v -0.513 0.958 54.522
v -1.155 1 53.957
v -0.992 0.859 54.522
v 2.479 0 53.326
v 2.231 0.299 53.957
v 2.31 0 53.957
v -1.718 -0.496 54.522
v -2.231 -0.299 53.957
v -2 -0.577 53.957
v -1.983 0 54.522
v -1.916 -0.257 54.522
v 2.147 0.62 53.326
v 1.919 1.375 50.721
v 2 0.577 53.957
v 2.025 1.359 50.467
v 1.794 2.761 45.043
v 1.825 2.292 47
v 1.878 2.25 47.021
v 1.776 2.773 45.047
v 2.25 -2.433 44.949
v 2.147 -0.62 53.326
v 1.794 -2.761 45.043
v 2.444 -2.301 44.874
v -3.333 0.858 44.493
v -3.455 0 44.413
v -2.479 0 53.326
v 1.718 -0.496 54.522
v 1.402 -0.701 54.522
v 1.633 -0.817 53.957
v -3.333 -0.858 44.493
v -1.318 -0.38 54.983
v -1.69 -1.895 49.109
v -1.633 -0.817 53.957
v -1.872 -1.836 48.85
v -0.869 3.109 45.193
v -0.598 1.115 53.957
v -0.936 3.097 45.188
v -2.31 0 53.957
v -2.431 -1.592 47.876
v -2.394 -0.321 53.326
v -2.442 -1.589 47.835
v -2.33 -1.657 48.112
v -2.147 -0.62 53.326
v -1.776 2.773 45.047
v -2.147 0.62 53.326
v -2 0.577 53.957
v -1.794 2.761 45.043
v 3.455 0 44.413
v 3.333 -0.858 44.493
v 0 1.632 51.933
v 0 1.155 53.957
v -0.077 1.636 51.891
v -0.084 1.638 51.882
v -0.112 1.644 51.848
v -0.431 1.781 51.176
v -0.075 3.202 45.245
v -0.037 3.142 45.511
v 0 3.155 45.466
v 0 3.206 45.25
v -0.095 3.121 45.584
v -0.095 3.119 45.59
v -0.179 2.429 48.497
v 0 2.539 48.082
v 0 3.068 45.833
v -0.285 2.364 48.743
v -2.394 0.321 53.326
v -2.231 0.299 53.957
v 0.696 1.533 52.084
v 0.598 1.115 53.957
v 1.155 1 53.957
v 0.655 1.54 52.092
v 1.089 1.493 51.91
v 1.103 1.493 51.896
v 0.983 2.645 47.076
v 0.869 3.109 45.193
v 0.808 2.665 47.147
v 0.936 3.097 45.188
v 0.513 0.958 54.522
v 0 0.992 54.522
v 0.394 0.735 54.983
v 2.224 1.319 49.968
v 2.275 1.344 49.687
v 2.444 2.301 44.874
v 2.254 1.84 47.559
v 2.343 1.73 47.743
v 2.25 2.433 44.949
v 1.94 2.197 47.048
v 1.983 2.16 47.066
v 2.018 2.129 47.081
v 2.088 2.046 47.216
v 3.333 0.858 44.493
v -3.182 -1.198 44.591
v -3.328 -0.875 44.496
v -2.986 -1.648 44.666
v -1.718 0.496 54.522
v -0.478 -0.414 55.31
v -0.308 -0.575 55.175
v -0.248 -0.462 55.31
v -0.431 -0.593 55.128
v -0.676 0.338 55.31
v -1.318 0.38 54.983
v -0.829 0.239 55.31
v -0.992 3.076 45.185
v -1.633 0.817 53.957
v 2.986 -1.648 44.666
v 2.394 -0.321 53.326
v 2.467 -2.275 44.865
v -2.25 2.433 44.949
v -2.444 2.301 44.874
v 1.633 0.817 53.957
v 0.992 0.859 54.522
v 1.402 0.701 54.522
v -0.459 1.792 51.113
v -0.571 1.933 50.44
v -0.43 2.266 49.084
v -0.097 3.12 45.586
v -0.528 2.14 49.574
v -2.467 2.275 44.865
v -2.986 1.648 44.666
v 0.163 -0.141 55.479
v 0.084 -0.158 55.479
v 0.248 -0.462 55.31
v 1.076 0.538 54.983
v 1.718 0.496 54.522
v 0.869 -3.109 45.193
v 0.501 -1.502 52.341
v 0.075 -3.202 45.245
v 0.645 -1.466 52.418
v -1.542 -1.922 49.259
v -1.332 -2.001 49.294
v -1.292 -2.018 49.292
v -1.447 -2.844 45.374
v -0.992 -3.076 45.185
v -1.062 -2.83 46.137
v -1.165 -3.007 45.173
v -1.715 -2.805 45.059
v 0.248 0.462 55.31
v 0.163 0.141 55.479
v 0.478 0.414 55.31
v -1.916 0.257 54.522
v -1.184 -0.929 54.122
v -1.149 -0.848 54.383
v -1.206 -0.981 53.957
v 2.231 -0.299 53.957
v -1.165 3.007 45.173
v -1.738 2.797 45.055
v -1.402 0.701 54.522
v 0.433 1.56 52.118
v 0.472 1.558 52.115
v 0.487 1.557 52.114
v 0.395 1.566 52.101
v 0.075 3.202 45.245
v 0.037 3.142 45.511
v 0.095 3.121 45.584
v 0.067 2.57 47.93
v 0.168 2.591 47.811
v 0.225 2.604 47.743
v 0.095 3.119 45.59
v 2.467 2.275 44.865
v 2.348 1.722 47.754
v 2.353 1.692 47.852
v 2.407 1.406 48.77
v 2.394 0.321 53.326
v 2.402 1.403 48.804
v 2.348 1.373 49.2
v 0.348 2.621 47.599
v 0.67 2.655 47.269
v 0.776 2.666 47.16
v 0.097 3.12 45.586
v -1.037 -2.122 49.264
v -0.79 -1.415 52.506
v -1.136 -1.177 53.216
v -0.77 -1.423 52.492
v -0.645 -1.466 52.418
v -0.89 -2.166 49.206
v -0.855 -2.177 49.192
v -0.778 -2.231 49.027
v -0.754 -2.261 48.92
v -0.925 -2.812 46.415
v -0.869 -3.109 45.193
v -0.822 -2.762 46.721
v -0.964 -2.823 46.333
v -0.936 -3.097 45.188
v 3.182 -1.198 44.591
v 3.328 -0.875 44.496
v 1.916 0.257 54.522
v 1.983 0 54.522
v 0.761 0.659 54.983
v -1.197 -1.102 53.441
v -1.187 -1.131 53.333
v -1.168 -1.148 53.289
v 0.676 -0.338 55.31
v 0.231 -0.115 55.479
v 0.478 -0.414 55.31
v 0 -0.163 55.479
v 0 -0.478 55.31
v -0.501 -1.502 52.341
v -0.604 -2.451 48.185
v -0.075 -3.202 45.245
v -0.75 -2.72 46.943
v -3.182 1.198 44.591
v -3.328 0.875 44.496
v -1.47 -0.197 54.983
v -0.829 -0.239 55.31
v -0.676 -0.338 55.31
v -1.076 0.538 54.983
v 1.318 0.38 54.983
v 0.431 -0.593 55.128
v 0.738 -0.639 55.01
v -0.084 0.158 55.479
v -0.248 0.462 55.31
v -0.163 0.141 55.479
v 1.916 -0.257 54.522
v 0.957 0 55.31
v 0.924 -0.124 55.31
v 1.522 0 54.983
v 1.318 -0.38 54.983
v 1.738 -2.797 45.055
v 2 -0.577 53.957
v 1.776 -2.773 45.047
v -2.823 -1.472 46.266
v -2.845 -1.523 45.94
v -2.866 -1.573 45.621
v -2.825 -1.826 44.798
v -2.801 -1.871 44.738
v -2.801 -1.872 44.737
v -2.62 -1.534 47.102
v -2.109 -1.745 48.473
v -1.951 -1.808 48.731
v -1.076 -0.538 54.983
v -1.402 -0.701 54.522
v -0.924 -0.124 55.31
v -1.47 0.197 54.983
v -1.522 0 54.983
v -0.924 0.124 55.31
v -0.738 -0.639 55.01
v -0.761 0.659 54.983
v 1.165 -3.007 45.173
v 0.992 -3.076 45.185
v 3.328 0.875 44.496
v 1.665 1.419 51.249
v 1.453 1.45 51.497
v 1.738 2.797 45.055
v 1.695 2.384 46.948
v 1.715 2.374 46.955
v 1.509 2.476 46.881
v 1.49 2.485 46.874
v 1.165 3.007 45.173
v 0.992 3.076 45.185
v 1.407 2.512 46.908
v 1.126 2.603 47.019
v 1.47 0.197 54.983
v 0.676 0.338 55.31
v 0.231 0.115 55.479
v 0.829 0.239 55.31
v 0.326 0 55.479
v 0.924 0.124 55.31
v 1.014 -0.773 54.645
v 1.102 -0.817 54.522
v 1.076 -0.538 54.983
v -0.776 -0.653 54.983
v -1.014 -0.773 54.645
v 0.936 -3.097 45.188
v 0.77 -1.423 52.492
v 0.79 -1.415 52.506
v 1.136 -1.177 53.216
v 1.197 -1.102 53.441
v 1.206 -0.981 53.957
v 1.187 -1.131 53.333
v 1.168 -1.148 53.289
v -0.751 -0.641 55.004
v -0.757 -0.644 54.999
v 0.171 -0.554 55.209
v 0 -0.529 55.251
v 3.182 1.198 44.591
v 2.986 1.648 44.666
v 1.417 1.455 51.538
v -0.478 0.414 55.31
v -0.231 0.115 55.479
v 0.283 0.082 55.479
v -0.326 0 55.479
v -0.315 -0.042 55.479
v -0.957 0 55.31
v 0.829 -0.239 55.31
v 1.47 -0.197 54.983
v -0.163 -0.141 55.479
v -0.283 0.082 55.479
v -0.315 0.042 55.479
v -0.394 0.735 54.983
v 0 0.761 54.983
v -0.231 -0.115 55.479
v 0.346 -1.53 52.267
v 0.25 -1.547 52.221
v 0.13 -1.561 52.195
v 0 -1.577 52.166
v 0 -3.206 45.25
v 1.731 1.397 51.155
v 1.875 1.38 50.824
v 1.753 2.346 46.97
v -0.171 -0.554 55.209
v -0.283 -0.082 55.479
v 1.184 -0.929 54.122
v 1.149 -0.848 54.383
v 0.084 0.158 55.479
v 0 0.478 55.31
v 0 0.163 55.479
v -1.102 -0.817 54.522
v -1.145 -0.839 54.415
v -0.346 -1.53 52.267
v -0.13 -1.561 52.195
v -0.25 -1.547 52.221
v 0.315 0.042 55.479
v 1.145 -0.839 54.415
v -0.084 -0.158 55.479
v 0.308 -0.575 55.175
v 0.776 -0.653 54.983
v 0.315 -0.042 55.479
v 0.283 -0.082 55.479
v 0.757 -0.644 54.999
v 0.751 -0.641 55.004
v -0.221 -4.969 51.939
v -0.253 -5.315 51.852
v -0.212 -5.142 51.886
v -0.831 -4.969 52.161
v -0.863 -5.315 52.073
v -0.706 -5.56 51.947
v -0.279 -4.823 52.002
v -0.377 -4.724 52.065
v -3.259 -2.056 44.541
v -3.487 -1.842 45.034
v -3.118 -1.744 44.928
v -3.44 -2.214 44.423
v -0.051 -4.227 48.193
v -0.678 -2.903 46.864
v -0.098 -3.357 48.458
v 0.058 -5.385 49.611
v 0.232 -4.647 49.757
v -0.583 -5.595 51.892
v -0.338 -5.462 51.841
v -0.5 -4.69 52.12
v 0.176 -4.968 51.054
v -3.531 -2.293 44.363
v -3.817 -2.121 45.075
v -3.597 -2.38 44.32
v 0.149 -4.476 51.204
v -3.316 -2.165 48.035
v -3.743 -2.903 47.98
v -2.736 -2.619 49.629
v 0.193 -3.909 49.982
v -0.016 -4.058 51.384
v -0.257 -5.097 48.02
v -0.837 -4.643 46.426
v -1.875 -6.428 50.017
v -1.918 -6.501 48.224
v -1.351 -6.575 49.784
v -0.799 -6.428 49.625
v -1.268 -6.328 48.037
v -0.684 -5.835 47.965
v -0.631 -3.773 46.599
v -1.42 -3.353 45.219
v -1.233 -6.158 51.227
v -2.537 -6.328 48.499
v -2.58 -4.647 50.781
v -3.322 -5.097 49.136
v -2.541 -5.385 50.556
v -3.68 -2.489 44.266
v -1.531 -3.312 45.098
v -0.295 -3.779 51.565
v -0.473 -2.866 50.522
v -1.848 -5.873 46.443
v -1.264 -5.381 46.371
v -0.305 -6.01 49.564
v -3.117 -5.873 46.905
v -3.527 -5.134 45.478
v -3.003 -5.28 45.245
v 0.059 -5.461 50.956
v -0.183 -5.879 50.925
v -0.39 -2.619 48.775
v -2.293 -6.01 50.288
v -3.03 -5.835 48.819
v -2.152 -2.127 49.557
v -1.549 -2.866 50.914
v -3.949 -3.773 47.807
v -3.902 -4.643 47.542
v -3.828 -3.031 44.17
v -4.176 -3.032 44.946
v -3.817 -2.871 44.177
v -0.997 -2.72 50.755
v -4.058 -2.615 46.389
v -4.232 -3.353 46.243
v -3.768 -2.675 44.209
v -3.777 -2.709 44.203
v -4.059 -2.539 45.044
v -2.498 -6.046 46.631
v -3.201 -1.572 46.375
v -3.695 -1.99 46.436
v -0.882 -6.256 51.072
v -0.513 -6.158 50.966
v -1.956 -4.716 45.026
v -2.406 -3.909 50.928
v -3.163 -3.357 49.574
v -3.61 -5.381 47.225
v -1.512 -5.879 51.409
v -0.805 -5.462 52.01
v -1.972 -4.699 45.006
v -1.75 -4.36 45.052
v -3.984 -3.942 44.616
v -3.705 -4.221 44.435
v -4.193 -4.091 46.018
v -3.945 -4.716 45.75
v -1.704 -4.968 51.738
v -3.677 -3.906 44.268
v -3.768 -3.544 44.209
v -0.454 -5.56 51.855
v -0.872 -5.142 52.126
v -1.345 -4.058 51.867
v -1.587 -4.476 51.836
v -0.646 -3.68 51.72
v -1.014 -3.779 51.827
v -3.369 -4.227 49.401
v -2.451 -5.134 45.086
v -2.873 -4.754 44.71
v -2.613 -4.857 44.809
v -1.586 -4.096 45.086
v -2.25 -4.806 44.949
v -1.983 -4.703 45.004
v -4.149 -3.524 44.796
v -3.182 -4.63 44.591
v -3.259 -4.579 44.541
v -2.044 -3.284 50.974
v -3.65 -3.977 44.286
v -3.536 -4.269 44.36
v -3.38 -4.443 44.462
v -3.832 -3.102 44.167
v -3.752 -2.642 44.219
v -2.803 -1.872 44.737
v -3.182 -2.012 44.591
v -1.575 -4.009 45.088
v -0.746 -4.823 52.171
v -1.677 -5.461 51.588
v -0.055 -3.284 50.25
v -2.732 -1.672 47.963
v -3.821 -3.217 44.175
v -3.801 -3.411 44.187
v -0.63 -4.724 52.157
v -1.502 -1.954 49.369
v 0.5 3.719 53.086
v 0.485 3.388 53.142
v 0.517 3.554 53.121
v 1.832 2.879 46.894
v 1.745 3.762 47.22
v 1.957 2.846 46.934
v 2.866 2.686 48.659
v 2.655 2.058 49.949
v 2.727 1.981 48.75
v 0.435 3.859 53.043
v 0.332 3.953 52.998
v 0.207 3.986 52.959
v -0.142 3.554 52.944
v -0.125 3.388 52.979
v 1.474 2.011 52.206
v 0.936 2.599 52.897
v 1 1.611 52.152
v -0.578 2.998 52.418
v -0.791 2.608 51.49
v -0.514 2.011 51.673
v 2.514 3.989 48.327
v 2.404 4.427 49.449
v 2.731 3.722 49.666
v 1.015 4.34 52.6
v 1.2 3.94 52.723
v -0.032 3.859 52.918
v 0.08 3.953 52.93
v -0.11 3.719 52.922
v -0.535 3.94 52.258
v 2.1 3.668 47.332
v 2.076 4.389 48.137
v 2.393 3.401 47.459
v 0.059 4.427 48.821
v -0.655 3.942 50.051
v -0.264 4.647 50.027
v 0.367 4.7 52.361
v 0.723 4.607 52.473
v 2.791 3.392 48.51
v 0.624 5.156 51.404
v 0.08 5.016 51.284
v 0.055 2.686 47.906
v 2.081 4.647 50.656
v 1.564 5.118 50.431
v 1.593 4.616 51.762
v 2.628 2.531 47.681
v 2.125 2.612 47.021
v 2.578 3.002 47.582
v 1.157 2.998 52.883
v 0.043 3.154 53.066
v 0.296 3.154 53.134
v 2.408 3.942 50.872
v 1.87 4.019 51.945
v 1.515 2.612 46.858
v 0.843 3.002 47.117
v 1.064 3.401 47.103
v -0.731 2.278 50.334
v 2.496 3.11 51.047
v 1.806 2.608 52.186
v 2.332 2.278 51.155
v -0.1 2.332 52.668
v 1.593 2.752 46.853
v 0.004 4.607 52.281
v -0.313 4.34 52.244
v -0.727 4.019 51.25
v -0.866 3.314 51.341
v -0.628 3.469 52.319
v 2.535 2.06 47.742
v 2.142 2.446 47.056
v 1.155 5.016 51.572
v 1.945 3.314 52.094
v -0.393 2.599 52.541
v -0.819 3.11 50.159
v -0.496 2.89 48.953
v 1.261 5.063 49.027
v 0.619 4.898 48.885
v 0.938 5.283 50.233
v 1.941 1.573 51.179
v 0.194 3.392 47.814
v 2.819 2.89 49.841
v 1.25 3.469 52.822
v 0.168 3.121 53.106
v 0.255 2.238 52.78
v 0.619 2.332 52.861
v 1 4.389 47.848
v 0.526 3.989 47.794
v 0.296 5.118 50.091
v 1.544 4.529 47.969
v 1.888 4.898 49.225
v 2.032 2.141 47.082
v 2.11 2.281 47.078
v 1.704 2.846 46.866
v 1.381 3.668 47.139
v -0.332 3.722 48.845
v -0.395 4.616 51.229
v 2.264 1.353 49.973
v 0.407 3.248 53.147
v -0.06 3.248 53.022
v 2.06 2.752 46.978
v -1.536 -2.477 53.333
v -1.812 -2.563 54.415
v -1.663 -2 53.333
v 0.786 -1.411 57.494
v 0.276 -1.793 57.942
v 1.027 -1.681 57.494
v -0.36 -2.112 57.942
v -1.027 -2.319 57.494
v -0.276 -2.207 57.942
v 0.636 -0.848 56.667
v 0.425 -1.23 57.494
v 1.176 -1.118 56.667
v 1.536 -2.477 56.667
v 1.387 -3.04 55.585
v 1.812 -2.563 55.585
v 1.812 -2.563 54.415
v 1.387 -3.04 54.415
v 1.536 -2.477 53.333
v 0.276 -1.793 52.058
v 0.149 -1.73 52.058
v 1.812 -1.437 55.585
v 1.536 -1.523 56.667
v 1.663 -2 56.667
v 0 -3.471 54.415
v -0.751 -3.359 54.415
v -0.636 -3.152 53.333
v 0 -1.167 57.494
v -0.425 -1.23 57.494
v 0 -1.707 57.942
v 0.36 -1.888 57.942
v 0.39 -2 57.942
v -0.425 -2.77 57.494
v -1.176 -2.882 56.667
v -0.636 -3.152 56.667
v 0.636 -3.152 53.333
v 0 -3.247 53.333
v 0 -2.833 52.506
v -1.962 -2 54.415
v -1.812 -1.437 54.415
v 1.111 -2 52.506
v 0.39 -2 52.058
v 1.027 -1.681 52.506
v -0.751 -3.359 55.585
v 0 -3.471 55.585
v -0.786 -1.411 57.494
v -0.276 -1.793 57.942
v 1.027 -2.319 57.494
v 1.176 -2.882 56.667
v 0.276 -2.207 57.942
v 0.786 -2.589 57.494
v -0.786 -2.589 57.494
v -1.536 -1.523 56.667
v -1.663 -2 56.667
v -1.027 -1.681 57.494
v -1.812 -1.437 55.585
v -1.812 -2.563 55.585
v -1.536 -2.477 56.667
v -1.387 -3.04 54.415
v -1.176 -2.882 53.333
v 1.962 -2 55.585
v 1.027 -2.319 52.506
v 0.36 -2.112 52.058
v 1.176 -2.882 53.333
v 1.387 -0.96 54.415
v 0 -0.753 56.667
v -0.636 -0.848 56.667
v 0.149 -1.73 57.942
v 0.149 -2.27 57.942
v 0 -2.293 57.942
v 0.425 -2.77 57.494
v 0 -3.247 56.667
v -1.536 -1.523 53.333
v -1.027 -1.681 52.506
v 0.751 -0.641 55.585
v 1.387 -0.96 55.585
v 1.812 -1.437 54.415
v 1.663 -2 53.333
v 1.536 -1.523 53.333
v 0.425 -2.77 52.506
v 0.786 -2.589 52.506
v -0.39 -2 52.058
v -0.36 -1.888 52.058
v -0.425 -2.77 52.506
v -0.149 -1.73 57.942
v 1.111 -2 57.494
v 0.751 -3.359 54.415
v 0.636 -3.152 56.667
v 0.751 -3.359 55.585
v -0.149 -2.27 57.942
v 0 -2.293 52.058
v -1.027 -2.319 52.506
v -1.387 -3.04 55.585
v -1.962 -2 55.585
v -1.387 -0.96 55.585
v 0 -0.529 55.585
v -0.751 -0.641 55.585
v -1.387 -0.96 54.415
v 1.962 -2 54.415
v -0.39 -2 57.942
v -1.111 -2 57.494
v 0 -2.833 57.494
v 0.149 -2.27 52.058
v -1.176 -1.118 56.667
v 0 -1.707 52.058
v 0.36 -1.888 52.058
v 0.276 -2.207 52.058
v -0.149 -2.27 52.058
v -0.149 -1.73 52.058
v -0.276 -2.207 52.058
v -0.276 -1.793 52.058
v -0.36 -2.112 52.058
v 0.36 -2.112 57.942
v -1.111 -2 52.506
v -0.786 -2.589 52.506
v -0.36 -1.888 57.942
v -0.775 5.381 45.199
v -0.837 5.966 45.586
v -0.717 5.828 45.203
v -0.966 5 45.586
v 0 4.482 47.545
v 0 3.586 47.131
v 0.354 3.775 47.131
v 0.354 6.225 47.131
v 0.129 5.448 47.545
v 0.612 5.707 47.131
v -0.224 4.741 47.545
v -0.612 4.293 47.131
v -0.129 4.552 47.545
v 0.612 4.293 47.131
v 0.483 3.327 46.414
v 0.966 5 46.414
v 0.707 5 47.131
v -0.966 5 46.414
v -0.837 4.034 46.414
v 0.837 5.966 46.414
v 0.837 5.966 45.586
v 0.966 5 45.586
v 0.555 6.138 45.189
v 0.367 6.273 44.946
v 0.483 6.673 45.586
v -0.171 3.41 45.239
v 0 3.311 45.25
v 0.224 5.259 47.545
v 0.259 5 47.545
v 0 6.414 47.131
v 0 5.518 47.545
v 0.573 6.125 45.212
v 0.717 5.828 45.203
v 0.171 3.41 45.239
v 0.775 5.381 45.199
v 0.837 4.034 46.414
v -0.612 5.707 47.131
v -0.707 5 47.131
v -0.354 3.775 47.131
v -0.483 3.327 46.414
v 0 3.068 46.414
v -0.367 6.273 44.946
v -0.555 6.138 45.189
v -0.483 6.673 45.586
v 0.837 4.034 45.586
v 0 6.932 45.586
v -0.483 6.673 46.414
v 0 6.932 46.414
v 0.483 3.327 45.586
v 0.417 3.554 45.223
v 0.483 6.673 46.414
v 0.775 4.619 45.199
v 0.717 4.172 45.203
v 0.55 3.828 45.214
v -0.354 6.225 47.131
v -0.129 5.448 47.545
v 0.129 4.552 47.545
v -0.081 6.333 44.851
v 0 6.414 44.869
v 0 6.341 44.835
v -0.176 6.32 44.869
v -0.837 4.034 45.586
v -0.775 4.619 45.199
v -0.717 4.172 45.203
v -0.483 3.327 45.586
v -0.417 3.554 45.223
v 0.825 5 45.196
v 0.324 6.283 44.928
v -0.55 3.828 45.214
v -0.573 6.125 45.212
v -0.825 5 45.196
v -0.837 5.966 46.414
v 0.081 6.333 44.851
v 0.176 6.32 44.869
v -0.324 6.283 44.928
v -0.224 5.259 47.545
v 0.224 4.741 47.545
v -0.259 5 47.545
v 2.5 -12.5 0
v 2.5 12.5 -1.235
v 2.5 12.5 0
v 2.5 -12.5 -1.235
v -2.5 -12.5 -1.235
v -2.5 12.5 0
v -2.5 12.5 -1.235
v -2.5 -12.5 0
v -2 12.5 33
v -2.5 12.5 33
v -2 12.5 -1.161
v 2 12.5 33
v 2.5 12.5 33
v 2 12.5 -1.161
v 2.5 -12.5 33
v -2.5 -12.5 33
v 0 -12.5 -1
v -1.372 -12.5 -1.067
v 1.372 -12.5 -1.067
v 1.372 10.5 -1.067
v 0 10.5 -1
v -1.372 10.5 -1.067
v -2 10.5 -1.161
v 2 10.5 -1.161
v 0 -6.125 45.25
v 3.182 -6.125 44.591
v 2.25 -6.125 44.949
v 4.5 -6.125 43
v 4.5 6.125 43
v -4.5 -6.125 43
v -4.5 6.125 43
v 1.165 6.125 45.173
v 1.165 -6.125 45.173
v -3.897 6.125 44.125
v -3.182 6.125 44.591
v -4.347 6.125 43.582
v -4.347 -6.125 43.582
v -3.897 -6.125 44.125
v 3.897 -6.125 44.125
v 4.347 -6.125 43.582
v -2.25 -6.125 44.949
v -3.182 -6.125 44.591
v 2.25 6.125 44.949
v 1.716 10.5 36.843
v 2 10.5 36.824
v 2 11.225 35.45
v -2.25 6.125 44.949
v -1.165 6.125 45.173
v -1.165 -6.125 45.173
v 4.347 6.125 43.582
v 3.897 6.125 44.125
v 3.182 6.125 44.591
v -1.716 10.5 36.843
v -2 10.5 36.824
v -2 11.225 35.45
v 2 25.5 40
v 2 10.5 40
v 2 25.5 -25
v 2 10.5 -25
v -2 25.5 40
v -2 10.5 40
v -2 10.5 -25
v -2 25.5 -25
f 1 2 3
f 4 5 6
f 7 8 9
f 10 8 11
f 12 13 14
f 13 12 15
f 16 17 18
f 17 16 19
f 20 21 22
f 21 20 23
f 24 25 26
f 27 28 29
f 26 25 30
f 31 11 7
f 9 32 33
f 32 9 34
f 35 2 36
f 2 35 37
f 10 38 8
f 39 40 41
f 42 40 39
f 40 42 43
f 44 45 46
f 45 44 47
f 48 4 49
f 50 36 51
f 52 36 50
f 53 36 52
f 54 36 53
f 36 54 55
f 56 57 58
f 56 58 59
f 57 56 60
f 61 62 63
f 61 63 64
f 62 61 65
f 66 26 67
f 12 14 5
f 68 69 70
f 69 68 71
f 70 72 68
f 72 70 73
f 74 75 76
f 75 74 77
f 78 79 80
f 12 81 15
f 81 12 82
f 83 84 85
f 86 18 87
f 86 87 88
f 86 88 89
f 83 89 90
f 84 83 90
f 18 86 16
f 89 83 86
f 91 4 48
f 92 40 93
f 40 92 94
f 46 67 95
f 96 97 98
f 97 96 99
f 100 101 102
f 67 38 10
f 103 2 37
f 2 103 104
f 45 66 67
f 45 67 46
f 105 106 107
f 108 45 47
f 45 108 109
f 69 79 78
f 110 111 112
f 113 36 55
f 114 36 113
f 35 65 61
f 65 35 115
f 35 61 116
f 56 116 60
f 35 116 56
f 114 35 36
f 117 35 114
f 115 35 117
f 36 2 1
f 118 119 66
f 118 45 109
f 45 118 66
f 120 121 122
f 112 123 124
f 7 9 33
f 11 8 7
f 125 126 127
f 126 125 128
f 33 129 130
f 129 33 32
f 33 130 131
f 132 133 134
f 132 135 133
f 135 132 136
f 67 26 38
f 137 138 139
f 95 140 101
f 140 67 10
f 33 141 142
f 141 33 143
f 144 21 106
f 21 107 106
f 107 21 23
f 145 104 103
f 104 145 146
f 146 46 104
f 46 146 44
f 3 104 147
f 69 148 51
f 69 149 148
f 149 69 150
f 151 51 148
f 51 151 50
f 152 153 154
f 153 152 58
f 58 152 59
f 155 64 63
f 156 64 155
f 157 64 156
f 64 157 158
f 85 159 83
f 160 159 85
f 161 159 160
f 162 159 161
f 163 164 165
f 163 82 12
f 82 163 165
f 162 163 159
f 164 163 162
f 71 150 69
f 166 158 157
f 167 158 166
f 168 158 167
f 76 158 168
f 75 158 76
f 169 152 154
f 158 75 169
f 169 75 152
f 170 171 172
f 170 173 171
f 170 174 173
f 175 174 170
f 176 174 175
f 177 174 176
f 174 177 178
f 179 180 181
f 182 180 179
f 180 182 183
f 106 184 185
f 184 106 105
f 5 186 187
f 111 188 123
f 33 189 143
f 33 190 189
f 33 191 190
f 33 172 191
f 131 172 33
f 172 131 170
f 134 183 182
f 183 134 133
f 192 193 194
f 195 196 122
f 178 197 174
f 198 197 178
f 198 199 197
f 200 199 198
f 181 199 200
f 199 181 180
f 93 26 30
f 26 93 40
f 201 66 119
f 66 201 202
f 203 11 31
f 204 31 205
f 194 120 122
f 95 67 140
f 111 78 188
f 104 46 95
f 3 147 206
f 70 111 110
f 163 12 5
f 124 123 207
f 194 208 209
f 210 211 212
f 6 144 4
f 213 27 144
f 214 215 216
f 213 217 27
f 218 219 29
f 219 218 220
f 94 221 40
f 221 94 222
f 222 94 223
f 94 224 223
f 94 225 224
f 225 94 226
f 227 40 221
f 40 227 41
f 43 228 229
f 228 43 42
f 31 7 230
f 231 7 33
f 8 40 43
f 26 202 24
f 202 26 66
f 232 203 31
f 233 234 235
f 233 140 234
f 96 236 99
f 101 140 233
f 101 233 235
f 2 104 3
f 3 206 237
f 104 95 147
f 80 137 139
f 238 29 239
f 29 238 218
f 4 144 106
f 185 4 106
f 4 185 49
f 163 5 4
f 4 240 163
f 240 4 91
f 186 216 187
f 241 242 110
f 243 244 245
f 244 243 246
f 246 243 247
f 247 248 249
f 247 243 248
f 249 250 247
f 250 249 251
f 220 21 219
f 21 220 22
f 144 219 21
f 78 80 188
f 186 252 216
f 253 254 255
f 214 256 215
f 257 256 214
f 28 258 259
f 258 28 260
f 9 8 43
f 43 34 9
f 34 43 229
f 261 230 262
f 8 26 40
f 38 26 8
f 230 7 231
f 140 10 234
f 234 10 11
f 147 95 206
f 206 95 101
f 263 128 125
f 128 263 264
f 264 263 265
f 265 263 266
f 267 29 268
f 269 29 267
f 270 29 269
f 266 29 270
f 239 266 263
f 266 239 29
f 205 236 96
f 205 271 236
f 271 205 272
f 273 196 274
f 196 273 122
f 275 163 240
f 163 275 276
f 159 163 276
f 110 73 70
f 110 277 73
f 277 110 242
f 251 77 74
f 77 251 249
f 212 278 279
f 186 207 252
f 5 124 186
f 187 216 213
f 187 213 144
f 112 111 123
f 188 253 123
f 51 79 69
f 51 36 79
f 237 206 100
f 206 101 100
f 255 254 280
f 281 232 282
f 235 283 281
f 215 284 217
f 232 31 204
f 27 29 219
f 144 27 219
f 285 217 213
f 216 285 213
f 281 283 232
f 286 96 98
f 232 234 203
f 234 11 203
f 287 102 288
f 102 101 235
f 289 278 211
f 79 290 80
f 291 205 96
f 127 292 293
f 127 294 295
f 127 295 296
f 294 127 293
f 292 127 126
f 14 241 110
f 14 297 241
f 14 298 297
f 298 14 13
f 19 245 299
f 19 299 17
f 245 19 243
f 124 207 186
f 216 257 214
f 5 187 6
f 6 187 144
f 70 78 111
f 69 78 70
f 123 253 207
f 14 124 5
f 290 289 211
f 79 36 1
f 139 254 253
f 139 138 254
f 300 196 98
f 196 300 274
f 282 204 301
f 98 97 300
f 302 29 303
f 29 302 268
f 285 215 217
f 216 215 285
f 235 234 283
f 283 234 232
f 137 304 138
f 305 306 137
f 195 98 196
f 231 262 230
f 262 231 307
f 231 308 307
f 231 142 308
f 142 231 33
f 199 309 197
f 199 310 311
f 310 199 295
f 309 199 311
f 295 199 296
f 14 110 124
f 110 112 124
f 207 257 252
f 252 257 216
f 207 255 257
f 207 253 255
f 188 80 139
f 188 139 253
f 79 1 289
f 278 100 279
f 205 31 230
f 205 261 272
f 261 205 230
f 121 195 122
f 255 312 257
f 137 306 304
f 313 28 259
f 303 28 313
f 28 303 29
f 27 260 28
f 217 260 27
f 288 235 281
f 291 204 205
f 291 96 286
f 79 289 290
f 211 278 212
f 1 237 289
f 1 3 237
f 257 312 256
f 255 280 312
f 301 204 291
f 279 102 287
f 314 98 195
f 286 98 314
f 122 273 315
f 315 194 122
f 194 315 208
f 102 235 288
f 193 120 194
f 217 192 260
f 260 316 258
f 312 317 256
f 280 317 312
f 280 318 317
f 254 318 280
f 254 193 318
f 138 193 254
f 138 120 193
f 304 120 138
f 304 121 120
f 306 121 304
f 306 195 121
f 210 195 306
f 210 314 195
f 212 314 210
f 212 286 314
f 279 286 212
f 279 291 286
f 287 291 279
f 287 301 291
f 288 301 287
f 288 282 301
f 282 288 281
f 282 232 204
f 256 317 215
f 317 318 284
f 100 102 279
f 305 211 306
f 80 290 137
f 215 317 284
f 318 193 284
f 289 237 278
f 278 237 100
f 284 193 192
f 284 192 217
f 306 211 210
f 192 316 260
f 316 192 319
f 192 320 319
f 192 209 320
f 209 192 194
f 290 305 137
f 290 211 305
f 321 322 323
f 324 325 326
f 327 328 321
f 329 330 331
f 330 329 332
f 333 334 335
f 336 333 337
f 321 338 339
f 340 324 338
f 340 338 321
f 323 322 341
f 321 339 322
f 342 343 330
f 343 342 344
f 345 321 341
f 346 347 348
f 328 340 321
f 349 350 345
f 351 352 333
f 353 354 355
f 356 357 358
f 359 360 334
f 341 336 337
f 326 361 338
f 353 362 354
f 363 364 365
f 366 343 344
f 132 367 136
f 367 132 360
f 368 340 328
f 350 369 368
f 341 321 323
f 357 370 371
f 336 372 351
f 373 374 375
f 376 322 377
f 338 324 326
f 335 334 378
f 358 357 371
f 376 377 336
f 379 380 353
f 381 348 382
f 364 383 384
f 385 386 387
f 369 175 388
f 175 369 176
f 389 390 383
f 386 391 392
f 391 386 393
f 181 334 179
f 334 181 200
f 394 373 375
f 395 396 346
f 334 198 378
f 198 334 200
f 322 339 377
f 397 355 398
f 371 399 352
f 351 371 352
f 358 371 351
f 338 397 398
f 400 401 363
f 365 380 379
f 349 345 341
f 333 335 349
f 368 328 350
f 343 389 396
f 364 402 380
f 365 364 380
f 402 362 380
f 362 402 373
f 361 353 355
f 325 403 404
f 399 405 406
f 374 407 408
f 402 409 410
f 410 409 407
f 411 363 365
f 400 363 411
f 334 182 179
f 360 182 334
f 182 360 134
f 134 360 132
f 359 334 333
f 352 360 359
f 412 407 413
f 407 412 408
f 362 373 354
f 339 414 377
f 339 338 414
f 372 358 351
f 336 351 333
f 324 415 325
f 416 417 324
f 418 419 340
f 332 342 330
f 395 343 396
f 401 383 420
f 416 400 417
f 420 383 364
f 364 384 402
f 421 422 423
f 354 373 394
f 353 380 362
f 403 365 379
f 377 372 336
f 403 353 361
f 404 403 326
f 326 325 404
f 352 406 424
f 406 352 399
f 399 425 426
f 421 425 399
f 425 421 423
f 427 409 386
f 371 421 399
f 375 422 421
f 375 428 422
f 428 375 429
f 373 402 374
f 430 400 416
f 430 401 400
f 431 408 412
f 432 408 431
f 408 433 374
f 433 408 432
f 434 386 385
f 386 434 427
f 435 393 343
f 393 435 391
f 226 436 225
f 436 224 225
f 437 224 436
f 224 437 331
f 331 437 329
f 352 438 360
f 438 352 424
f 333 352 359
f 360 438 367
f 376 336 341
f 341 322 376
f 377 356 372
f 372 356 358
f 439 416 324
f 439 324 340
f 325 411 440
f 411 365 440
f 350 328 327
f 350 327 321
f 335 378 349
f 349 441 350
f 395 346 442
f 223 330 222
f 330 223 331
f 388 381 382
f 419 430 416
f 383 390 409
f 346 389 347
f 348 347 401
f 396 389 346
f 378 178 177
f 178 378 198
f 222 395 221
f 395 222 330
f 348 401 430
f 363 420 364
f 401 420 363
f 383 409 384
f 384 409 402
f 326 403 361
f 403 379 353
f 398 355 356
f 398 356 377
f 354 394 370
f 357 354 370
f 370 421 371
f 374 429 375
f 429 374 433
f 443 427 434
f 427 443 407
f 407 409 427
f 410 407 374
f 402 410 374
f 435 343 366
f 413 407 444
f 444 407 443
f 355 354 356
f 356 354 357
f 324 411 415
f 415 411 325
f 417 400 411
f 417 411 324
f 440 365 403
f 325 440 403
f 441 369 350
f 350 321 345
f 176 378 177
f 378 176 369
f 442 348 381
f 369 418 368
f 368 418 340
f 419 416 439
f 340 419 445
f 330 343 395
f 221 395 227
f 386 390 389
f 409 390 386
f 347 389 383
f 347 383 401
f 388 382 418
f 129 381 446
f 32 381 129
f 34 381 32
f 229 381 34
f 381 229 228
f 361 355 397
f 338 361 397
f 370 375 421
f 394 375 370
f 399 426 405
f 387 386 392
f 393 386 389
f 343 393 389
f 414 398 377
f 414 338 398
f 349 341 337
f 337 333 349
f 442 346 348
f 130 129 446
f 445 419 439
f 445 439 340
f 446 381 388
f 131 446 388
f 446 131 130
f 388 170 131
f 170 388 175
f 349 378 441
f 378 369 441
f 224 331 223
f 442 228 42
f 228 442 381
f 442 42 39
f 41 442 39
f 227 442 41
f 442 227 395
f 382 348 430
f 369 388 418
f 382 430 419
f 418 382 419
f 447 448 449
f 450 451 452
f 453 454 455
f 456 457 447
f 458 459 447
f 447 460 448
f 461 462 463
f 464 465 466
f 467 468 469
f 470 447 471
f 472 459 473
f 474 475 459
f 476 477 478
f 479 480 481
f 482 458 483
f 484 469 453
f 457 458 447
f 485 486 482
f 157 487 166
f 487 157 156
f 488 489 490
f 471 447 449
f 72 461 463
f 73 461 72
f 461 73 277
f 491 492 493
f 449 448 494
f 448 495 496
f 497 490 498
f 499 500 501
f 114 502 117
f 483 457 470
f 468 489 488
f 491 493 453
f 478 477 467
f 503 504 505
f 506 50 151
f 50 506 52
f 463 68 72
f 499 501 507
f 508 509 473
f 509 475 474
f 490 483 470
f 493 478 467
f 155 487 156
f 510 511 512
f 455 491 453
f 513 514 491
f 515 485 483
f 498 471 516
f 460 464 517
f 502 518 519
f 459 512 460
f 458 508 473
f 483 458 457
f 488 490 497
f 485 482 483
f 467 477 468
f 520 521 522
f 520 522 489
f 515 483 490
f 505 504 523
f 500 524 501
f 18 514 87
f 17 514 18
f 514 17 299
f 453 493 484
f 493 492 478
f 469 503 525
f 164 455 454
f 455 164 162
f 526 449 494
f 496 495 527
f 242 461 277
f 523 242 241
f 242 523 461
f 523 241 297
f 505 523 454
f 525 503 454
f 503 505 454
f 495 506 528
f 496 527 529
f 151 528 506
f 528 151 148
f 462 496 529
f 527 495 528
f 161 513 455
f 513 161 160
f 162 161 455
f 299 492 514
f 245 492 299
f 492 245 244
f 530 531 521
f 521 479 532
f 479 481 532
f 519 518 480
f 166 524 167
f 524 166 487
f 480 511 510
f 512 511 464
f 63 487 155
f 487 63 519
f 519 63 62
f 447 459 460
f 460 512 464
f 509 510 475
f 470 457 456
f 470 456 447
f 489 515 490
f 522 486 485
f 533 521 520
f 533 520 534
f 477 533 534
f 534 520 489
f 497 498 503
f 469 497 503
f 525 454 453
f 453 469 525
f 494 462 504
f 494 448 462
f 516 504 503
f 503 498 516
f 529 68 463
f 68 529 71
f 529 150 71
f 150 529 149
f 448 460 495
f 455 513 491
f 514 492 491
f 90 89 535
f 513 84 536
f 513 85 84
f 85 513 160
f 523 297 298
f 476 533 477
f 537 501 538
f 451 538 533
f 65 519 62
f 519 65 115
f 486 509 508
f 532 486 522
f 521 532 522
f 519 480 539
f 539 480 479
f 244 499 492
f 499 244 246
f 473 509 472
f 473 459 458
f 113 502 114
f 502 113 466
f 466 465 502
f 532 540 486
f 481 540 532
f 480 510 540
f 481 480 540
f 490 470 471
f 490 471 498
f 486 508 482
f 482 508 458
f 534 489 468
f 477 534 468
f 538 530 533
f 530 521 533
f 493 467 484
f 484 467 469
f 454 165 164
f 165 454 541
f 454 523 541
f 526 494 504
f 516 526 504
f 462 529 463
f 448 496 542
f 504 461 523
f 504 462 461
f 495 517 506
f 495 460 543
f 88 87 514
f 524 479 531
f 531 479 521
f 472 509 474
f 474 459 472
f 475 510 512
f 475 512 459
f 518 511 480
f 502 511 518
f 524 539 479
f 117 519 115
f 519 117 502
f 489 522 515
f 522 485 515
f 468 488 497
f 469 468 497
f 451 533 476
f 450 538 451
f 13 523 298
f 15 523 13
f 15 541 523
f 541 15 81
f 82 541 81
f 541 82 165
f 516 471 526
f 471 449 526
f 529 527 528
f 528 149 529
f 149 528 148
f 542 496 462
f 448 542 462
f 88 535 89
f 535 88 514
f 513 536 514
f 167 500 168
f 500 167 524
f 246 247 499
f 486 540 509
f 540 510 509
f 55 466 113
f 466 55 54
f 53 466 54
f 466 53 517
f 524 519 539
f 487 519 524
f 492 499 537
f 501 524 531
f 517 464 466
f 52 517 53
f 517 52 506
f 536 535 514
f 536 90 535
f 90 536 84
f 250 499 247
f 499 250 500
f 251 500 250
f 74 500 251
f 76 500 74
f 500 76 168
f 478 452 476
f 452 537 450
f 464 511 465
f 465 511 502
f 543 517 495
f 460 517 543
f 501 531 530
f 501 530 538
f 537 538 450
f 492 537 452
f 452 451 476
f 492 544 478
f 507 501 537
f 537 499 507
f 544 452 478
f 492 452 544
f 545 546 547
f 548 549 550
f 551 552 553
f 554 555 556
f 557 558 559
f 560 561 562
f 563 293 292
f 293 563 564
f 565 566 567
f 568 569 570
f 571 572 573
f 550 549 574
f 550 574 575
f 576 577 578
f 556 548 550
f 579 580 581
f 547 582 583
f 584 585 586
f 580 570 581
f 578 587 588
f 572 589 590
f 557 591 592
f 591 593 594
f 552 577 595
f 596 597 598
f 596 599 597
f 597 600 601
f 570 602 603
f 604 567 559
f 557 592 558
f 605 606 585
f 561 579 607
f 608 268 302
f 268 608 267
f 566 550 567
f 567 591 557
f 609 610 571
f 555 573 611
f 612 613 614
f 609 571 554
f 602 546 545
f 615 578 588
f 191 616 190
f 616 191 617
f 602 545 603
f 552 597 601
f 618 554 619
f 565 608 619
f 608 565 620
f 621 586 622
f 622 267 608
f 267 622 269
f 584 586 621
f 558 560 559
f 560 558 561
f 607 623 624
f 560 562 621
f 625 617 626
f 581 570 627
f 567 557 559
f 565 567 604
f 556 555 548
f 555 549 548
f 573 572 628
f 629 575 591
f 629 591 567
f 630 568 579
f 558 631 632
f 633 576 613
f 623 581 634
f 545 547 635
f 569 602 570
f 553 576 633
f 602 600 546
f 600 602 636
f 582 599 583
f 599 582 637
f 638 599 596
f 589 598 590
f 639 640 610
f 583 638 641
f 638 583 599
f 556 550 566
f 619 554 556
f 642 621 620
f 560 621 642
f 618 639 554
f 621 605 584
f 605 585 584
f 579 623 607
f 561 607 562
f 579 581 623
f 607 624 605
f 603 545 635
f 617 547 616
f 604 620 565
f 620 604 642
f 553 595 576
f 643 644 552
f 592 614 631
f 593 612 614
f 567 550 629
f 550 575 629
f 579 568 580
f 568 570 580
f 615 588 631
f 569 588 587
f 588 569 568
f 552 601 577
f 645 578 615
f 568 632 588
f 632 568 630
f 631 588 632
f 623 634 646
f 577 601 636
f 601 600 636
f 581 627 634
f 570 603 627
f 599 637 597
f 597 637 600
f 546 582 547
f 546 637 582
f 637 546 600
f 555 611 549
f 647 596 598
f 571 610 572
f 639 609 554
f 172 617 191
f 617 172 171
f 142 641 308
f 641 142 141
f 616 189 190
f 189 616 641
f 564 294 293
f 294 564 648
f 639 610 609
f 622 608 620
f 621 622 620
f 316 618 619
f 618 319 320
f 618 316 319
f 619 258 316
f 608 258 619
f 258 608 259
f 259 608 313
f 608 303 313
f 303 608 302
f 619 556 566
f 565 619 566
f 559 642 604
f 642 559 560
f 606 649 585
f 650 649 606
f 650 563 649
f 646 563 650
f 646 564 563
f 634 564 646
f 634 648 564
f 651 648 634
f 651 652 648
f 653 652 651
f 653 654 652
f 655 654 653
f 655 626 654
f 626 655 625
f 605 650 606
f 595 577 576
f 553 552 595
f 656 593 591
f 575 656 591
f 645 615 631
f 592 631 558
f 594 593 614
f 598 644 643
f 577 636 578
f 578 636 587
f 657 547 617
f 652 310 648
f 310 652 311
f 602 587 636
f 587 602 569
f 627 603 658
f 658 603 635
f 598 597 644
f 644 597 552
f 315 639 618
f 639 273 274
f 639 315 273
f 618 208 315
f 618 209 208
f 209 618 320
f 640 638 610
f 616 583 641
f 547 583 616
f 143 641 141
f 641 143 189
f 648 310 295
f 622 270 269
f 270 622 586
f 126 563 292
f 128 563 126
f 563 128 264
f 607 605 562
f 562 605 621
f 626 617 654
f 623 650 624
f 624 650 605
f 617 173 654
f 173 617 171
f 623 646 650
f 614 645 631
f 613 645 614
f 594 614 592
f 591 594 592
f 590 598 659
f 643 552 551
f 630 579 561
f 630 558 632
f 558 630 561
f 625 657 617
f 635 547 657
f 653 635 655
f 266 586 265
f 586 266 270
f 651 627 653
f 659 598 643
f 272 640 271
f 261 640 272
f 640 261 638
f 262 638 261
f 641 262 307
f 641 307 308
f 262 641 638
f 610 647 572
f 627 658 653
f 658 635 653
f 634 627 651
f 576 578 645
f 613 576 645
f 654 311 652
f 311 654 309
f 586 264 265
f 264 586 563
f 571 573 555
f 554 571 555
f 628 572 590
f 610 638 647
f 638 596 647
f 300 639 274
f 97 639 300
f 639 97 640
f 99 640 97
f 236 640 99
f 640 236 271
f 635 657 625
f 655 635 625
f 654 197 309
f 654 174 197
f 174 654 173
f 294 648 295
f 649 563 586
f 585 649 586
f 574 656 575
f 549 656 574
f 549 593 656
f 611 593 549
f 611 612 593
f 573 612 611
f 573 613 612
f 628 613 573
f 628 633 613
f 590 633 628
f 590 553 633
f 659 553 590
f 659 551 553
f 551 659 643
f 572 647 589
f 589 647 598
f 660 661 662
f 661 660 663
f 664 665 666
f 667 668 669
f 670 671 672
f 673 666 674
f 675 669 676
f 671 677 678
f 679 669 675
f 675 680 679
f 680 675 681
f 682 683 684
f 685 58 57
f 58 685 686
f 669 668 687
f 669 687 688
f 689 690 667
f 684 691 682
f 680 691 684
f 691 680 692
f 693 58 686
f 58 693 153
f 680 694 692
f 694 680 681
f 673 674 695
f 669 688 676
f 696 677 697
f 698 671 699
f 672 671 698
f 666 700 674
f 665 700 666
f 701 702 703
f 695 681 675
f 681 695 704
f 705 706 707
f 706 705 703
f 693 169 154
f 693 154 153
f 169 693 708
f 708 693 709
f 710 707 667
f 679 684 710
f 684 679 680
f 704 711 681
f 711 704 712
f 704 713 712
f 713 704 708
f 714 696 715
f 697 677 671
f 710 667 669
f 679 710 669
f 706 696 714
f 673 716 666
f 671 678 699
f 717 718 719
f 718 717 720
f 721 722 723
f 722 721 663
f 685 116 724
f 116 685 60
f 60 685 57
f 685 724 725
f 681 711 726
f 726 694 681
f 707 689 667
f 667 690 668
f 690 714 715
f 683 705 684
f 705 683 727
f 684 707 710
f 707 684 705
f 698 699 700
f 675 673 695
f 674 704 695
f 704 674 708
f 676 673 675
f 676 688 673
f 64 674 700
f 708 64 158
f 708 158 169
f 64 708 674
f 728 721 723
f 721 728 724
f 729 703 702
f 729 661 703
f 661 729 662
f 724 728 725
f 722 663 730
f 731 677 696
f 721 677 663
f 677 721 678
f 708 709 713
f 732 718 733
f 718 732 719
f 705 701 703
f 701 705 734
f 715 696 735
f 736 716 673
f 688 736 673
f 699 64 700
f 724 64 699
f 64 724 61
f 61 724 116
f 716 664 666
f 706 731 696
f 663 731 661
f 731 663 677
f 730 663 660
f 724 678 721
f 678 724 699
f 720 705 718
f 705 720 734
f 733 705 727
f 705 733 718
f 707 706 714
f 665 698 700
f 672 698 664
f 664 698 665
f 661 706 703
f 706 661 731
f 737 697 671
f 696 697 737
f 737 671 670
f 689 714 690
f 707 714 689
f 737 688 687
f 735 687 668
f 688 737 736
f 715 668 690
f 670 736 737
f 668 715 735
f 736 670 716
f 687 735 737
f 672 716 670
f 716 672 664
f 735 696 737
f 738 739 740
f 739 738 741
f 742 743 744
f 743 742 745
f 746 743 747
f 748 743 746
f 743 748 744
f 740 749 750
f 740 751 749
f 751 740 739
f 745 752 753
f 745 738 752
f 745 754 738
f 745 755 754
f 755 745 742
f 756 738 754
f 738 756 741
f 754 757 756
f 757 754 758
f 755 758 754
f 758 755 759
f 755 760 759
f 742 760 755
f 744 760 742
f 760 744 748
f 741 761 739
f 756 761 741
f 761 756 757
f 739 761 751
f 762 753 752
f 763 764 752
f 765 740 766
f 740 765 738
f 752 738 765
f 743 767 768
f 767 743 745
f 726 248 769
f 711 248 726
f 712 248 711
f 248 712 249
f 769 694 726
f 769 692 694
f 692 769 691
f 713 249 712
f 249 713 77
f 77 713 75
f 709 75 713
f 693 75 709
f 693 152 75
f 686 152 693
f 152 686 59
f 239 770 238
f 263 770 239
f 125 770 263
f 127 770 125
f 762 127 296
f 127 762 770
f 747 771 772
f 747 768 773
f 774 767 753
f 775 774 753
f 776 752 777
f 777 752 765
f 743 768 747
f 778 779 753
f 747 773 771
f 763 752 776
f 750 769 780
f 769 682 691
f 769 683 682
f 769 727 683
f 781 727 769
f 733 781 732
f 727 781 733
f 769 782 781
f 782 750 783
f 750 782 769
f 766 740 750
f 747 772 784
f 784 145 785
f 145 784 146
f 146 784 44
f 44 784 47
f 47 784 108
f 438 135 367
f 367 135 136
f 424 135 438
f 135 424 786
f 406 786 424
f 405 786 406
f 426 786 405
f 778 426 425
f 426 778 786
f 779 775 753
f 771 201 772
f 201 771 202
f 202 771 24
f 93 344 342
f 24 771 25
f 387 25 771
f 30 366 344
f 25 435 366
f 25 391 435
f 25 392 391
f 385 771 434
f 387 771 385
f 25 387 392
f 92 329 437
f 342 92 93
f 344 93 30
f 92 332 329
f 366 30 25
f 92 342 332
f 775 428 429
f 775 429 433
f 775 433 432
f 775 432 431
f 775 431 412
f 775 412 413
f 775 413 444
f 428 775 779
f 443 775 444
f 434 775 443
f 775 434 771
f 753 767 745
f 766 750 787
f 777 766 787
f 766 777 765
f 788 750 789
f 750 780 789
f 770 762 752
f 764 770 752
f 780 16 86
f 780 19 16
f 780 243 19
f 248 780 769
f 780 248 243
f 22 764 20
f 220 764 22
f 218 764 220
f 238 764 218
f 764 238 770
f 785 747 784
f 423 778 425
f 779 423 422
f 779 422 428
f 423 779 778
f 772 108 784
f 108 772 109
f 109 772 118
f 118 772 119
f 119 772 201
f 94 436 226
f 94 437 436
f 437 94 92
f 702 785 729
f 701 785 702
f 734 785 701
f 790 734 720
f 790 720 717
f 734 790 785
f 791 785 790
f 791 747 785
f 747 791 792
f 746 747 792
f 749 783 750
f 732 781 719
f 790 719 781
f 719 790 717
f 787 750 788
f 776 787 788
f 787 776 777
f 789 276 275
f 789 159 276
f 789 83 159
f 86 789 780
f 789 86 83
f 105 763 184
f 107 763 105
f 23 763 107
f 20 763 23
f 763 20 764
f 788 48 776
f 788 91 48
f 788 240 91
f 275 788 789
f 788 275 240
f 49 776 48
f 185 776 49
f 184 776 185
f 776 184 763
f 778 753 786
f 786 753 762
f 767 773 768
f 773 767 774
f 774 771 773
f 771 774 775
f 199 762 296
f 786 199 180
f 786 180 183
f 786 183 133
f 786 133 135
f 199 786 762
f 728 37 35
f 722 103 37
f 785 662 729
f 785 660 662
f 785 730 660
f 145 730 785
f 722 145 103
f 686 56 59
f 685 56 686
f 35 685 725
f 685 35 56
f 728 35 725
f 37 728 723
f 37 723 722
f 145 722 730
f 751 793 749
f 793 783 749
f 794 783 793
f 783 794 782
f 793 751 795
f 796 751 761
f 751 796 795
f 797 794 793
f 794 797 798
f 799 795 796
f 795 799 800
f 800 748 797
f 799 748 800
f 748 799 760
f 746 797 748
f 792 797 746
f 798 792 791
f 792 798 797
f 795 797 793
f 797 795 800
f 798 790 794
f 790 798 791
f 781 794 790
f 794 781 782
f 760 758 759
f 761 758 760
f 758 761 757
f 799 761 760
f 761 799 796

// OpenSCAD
// file: common.scad
/*
 * WAVE OCEAN V10 - VERTICAL SLAT SYSTEM
 * COMMON PARAMETERS
 *
 * Three slat designs: Standard (A), Foam (B), Breaking Curl (C)
 * Structural backplate with vertical grooves
 * No front guide rails - clean viewer POV
 */

// ============================================
// PRINT TOLERANCES
// ============================================

TOL_CLEARANCE = 0.2;
TOL_SLIDING = 0.3;
TOL_PRESS_FIT = -0.15;

// ============================================
// HARDWARE
// ============================================

BEARING_608_ID = 8;
BEARING_608_OD = 22;
BEARING_608_H = 7;

SHAFT_DIA = 8;
SHAFT_LENGTH = 260;

M3_HOLE = 3.2;
M4_HOLE = 4.2;

// ============================================
// TWISTED CAM DIMENSIONS
// ============================================

CAM_LENGTH = 200;
CAM_CORE_RADIUS = 12;
CAM_RIDGE_HEIGHT = 12;           // Wave amplitude
CAM_MAX_RADIUS = CAM_CORE_RADIUS + CAM_RIDGE_HEIGHT;  // 24mm

HELIX_TURNS = 2;
HELIX_PITCH = CAM_LENGTH / HELIX_TURNS;

// ============================================
// SLAT COMMON DIMENSIONS
// ============================================

NUM_SLATS = 24;
SLAT_SPACING = CAM_LENGTH / NUM_SLATS;  // 8.33mm

SLAT_THICKNESS = 5;              // X dimension (along cam axis)
SLAT_DEPTH = 25;                 // Y dimension (into backplate)

// Individual slat heights (Z dimension)
SLAT_A_HEIGHT = 50;              // Standard
SLAT_B_HEIGHT = 55;              // Foam crest (taller)
SLAT_C_HEIGHT = 60;              // Breaking curl (tallest)

// Back tab dimensions (slides in backplate groove)
TAB_WIDTH = 4;
TAB_DEPTH = 15;                  // How deep into backplate
TAB_HEIGHT_EXTENSION = 25;       // Extra height for groove engagement

// Cam follower bottom
FOLLOWER_CURVE_RADIUS = CAM_CORE_RADIUS + 2;  // 14mm

// ============================================
// SLAT TYPE ASSIGNMENT
// Pattern: A=Standard, B=Foam, C=Breaking Curl
// C types placed at wave peak positions
// ============================================

// 0-indexed array: which type for each position
SLAT_TYPES = [
    "A", "B", "A", "A", "C",    // 0-4
    "A", "B", "A", "C", "A",    // 5-9
    "A", "B", "A", "C", "A",    // 10-14
    "B", "A", "A", "C", "A",    // 15-19
    "B", "A", "A", "B"          // 20-23
];

function slat_type(i) = SLAT_TYPES[i];

function slat_height(i) =
    let(t = slat_type(i))
    t == "A" ? SLAT_A_HEIGHT :
    t == "B" ? SLAT_B_HEIGHT :
    t == "C" ? SLAT_C_HEIGHT : SLAT_A_HEIGHT;

// ============================================
// BACKPLATE DIMENSIONS
// ============================================

BACKPLATE_WIDTH = CAM_LENGTH + 40;   // 240mm
BACKPLATE_HEIGHT = 100;               // Tall enough for wave travel + slats
BACKPLATE_THICKNESS = 20;             // Structural thickness

// Groove dimensions
GROOVE_WIDTH = TAB_WIDTH + TOL_SLIDING;  // 4.3mm
GROOVE_DEPTH = TAB_DEPTH + 2;            // 17mm into backplate
GROOVE_HEIGHT = CAM_RIDGE_HEIGHT * 2 + SLAT_C_HEIGHT + 20;  // Full travel range

// ============================================
// ASSEMBLY POSITIONS
// ============================================

BASE_THICKNESS = 5;

// Cam center height
CAM_CENTER_Z = 35;

// Backplate position (behind slats)
BACKPLATE_Y = SLAT_DEPTH / 2 + 5;     // 17.5mm behind center
BACKPLATE_Z = CAM_CENTER_Z - 10;       // Starts below cam center

// ============================================
// COLORS
// ============================================

C_SLAT_A = [0.15, 0.35, 0.65];        // Standard blue
C_SLAT_B = [0.2, 0.45, 0.75];         // Lighter blue (foam)
C_SLAT_C = [0.1, 0.3, 0.55];          // Darker blue (curl)
C_FOAM = [0.95, 0.97, 1.0];           // White foam
C_BACKPLATE = [0.25, 0.2, 0.15];      // Dark wood
C_CAM = [0.7, 0.55, 0.3];
C_SHAFT = [0.6, 0.6, 0.65];

// ============================================
// HELPER FUNCTIONS
// ============================================

function helix_phase(x) = ((x + CAM_LENGTH/2) / CAM_LENGTH) * 360 * HELIX_TURNS;

function ridge_height(x, theta) =
    let(phase = helix_phase(x) + theta)
    CAM_RIDGE_HEIGHT * max(0, cos(phase - 90));

function cam_radius(x, theta) = CAM_CORE_RADIUS + ridge_height(x, theta);

function slat_x(i) = i * SLAT_SPACING - CAM_LENGTH/2 + SLAT_SPACING/2;

function slat_z(i, theta) =
    let(x = slat_x(i))
    CAM_CENTER_Z + cam_radius(x, theta);

// ============================================
// QUALITY
// ============================================

$fn = 48;
// main file
/*
 * SLAT TYPE B - Foam Crest
 *
 * Quantity: 8x
 * Height: 55mm (taller than A)
 * Character: Irregular foam fingers, more dramatic white area
 * Use: Accent pieces, adds texture variety
 *
 * Profile:
 *       ∿╭─╮∿
 *       ╱    ╲
 *      ╱      ╲
 *     │        │
 *     │   ▯    │ ← Back tab
 *     ╰────────╯ ← Curved cam follower
 */

include <common.scad>

$fn = 48;

// ============================================
// MAIN MODULE
// ============================================

module slat_type_B() {
    union() {
        // Main wave body (blue)
        color(C_SLAT_B)
        wave_body_B();

        // Foam crest (white) - separate for color
        color(C_FOAM)
        foam_crest_B();

        // Back tab
        color(C_SLAT_B)
        back_tab_B();

        // Cam follower
        color(C_SLAT_B)
        cam_follower_B();
    }
}

// ============================================
// WAVE BODY - Taller, ends before foam
// ============================================

module wave_body_B() {
    height = SLAT_B_HEIGHT;
    foam_start = height - 12;  // Foam takes top 12mm

    // Main body
    hull() {
        // Base
        translate([-SLAT_THICKNESS/2, -SLAT_DEPTH/2, 0])
            cube([SLAT_THICKNESS, SLAT_DEPTH, foam_start - 10]);

        // Shoulder before foam
        translate([0, 0, foam_start])
        scale([1, 0.7, 0.5])
        rotate([90, 0, 0])
            cylinder(d = SLAT_THICKNESS + 4, h = SLAT_DEPTH * 0.7, center = true, $fn = 24);
    }
}

// ============================================
// FOAM CREST - Irregular fingers
// ============================================

module foam_crest_B() {
    height = SLAT_B_HEIGHT;
    foam_base = height - 12;

    // Central dome
    translate([0, 0, foam_base])
    hull() {
        cylinder(d = SLAT_THICKNESS + 2, h = 1, $fn = 24);
        translate([0, 0, 10])
        scale([1, 0.5, 1])
            sphere(d = SLAT_THICKNESS, $fn = 24);
    }

    // Foam fingers - irregular protrusions
    // Left finger
    translate([-2, -4, foam_base + 5])
    rotate([15, 20, 0])
    scale([0.6, 0.8, 1.5])
        sphere(d = 6, $fn = 16);

    // Right finger
    translate([1, 3, foam_base + 7])
    rotate([-10, -15, 0])
    scale([0.7, 0.9, 1.3])
        sphere(d = 5, $fn = 16);

    // Top splash
    translate([0, -2, height])
    scale([0.8, 0.6, 1.2])
        sphere(d = 5, $fn = 16);

    // Back drip
    translate([0, 5, foam_base + 3])
    scale([0.5, 1, 0.8])
        sphere(d = 4, $fn = 12);
}

// ============================================
// BACK TAB
// ============================================

module back_tab_B() {
    tab_start_z = -TAB_HEIGHT_EXTENSION;
    tab_end_z = SLAT_B_HEIGHT - 15;
    tab_total_height = tab_end_z - tab_start_z;

    translate([-TAB_WIDTH/2, SLAT_DEPTH/2 - 2, tab_start_z])
        cube([TAB_WIDTH, TAB_DEPTH, tab_total_height]);
}

// ============================================
// CAM FOLLOWER
// ============================================

module cam_follower_B() {
    follower_height = 8;

    translate([0, 0, -follower_height])
    difference() {
        translate([-SLAT_THICKNESS/2, -SLAT_DEPTH/2, 0])
            cube([SLAT_THICKNESS, SLAT_DEPTH, follower_height + 1]);

        translate([0, 0, -FOLLOWER_CURVE_RADIUS + follower_height - 1])
        rotate([90, 0, 0])
            cylinder(r = FOLLOWER_CURVE_RADIUS, h = SLAT_DEPTH + 2, center = true, $fn = 64);
    }
}

// ============================================
// RENDER
// ============================================

slat_type_B();

// Reference
%translate([0, 0, -FOLLOWER_CURVE_RADIUS - 8])
rotate([90, 0, 0])
    cylinder(r = CAM_CORE_RADIUS, h = SLAT_DEPTH + 20, center = true, $fn = 32);

echo("=== SLAT TYPE B: Foam Crest ===");
echo(str("Height: ", SLAT_B_HEIGHT, "mm"));
echo("Print quantity: 8");
echo("Note: Foam detail may need supports");
